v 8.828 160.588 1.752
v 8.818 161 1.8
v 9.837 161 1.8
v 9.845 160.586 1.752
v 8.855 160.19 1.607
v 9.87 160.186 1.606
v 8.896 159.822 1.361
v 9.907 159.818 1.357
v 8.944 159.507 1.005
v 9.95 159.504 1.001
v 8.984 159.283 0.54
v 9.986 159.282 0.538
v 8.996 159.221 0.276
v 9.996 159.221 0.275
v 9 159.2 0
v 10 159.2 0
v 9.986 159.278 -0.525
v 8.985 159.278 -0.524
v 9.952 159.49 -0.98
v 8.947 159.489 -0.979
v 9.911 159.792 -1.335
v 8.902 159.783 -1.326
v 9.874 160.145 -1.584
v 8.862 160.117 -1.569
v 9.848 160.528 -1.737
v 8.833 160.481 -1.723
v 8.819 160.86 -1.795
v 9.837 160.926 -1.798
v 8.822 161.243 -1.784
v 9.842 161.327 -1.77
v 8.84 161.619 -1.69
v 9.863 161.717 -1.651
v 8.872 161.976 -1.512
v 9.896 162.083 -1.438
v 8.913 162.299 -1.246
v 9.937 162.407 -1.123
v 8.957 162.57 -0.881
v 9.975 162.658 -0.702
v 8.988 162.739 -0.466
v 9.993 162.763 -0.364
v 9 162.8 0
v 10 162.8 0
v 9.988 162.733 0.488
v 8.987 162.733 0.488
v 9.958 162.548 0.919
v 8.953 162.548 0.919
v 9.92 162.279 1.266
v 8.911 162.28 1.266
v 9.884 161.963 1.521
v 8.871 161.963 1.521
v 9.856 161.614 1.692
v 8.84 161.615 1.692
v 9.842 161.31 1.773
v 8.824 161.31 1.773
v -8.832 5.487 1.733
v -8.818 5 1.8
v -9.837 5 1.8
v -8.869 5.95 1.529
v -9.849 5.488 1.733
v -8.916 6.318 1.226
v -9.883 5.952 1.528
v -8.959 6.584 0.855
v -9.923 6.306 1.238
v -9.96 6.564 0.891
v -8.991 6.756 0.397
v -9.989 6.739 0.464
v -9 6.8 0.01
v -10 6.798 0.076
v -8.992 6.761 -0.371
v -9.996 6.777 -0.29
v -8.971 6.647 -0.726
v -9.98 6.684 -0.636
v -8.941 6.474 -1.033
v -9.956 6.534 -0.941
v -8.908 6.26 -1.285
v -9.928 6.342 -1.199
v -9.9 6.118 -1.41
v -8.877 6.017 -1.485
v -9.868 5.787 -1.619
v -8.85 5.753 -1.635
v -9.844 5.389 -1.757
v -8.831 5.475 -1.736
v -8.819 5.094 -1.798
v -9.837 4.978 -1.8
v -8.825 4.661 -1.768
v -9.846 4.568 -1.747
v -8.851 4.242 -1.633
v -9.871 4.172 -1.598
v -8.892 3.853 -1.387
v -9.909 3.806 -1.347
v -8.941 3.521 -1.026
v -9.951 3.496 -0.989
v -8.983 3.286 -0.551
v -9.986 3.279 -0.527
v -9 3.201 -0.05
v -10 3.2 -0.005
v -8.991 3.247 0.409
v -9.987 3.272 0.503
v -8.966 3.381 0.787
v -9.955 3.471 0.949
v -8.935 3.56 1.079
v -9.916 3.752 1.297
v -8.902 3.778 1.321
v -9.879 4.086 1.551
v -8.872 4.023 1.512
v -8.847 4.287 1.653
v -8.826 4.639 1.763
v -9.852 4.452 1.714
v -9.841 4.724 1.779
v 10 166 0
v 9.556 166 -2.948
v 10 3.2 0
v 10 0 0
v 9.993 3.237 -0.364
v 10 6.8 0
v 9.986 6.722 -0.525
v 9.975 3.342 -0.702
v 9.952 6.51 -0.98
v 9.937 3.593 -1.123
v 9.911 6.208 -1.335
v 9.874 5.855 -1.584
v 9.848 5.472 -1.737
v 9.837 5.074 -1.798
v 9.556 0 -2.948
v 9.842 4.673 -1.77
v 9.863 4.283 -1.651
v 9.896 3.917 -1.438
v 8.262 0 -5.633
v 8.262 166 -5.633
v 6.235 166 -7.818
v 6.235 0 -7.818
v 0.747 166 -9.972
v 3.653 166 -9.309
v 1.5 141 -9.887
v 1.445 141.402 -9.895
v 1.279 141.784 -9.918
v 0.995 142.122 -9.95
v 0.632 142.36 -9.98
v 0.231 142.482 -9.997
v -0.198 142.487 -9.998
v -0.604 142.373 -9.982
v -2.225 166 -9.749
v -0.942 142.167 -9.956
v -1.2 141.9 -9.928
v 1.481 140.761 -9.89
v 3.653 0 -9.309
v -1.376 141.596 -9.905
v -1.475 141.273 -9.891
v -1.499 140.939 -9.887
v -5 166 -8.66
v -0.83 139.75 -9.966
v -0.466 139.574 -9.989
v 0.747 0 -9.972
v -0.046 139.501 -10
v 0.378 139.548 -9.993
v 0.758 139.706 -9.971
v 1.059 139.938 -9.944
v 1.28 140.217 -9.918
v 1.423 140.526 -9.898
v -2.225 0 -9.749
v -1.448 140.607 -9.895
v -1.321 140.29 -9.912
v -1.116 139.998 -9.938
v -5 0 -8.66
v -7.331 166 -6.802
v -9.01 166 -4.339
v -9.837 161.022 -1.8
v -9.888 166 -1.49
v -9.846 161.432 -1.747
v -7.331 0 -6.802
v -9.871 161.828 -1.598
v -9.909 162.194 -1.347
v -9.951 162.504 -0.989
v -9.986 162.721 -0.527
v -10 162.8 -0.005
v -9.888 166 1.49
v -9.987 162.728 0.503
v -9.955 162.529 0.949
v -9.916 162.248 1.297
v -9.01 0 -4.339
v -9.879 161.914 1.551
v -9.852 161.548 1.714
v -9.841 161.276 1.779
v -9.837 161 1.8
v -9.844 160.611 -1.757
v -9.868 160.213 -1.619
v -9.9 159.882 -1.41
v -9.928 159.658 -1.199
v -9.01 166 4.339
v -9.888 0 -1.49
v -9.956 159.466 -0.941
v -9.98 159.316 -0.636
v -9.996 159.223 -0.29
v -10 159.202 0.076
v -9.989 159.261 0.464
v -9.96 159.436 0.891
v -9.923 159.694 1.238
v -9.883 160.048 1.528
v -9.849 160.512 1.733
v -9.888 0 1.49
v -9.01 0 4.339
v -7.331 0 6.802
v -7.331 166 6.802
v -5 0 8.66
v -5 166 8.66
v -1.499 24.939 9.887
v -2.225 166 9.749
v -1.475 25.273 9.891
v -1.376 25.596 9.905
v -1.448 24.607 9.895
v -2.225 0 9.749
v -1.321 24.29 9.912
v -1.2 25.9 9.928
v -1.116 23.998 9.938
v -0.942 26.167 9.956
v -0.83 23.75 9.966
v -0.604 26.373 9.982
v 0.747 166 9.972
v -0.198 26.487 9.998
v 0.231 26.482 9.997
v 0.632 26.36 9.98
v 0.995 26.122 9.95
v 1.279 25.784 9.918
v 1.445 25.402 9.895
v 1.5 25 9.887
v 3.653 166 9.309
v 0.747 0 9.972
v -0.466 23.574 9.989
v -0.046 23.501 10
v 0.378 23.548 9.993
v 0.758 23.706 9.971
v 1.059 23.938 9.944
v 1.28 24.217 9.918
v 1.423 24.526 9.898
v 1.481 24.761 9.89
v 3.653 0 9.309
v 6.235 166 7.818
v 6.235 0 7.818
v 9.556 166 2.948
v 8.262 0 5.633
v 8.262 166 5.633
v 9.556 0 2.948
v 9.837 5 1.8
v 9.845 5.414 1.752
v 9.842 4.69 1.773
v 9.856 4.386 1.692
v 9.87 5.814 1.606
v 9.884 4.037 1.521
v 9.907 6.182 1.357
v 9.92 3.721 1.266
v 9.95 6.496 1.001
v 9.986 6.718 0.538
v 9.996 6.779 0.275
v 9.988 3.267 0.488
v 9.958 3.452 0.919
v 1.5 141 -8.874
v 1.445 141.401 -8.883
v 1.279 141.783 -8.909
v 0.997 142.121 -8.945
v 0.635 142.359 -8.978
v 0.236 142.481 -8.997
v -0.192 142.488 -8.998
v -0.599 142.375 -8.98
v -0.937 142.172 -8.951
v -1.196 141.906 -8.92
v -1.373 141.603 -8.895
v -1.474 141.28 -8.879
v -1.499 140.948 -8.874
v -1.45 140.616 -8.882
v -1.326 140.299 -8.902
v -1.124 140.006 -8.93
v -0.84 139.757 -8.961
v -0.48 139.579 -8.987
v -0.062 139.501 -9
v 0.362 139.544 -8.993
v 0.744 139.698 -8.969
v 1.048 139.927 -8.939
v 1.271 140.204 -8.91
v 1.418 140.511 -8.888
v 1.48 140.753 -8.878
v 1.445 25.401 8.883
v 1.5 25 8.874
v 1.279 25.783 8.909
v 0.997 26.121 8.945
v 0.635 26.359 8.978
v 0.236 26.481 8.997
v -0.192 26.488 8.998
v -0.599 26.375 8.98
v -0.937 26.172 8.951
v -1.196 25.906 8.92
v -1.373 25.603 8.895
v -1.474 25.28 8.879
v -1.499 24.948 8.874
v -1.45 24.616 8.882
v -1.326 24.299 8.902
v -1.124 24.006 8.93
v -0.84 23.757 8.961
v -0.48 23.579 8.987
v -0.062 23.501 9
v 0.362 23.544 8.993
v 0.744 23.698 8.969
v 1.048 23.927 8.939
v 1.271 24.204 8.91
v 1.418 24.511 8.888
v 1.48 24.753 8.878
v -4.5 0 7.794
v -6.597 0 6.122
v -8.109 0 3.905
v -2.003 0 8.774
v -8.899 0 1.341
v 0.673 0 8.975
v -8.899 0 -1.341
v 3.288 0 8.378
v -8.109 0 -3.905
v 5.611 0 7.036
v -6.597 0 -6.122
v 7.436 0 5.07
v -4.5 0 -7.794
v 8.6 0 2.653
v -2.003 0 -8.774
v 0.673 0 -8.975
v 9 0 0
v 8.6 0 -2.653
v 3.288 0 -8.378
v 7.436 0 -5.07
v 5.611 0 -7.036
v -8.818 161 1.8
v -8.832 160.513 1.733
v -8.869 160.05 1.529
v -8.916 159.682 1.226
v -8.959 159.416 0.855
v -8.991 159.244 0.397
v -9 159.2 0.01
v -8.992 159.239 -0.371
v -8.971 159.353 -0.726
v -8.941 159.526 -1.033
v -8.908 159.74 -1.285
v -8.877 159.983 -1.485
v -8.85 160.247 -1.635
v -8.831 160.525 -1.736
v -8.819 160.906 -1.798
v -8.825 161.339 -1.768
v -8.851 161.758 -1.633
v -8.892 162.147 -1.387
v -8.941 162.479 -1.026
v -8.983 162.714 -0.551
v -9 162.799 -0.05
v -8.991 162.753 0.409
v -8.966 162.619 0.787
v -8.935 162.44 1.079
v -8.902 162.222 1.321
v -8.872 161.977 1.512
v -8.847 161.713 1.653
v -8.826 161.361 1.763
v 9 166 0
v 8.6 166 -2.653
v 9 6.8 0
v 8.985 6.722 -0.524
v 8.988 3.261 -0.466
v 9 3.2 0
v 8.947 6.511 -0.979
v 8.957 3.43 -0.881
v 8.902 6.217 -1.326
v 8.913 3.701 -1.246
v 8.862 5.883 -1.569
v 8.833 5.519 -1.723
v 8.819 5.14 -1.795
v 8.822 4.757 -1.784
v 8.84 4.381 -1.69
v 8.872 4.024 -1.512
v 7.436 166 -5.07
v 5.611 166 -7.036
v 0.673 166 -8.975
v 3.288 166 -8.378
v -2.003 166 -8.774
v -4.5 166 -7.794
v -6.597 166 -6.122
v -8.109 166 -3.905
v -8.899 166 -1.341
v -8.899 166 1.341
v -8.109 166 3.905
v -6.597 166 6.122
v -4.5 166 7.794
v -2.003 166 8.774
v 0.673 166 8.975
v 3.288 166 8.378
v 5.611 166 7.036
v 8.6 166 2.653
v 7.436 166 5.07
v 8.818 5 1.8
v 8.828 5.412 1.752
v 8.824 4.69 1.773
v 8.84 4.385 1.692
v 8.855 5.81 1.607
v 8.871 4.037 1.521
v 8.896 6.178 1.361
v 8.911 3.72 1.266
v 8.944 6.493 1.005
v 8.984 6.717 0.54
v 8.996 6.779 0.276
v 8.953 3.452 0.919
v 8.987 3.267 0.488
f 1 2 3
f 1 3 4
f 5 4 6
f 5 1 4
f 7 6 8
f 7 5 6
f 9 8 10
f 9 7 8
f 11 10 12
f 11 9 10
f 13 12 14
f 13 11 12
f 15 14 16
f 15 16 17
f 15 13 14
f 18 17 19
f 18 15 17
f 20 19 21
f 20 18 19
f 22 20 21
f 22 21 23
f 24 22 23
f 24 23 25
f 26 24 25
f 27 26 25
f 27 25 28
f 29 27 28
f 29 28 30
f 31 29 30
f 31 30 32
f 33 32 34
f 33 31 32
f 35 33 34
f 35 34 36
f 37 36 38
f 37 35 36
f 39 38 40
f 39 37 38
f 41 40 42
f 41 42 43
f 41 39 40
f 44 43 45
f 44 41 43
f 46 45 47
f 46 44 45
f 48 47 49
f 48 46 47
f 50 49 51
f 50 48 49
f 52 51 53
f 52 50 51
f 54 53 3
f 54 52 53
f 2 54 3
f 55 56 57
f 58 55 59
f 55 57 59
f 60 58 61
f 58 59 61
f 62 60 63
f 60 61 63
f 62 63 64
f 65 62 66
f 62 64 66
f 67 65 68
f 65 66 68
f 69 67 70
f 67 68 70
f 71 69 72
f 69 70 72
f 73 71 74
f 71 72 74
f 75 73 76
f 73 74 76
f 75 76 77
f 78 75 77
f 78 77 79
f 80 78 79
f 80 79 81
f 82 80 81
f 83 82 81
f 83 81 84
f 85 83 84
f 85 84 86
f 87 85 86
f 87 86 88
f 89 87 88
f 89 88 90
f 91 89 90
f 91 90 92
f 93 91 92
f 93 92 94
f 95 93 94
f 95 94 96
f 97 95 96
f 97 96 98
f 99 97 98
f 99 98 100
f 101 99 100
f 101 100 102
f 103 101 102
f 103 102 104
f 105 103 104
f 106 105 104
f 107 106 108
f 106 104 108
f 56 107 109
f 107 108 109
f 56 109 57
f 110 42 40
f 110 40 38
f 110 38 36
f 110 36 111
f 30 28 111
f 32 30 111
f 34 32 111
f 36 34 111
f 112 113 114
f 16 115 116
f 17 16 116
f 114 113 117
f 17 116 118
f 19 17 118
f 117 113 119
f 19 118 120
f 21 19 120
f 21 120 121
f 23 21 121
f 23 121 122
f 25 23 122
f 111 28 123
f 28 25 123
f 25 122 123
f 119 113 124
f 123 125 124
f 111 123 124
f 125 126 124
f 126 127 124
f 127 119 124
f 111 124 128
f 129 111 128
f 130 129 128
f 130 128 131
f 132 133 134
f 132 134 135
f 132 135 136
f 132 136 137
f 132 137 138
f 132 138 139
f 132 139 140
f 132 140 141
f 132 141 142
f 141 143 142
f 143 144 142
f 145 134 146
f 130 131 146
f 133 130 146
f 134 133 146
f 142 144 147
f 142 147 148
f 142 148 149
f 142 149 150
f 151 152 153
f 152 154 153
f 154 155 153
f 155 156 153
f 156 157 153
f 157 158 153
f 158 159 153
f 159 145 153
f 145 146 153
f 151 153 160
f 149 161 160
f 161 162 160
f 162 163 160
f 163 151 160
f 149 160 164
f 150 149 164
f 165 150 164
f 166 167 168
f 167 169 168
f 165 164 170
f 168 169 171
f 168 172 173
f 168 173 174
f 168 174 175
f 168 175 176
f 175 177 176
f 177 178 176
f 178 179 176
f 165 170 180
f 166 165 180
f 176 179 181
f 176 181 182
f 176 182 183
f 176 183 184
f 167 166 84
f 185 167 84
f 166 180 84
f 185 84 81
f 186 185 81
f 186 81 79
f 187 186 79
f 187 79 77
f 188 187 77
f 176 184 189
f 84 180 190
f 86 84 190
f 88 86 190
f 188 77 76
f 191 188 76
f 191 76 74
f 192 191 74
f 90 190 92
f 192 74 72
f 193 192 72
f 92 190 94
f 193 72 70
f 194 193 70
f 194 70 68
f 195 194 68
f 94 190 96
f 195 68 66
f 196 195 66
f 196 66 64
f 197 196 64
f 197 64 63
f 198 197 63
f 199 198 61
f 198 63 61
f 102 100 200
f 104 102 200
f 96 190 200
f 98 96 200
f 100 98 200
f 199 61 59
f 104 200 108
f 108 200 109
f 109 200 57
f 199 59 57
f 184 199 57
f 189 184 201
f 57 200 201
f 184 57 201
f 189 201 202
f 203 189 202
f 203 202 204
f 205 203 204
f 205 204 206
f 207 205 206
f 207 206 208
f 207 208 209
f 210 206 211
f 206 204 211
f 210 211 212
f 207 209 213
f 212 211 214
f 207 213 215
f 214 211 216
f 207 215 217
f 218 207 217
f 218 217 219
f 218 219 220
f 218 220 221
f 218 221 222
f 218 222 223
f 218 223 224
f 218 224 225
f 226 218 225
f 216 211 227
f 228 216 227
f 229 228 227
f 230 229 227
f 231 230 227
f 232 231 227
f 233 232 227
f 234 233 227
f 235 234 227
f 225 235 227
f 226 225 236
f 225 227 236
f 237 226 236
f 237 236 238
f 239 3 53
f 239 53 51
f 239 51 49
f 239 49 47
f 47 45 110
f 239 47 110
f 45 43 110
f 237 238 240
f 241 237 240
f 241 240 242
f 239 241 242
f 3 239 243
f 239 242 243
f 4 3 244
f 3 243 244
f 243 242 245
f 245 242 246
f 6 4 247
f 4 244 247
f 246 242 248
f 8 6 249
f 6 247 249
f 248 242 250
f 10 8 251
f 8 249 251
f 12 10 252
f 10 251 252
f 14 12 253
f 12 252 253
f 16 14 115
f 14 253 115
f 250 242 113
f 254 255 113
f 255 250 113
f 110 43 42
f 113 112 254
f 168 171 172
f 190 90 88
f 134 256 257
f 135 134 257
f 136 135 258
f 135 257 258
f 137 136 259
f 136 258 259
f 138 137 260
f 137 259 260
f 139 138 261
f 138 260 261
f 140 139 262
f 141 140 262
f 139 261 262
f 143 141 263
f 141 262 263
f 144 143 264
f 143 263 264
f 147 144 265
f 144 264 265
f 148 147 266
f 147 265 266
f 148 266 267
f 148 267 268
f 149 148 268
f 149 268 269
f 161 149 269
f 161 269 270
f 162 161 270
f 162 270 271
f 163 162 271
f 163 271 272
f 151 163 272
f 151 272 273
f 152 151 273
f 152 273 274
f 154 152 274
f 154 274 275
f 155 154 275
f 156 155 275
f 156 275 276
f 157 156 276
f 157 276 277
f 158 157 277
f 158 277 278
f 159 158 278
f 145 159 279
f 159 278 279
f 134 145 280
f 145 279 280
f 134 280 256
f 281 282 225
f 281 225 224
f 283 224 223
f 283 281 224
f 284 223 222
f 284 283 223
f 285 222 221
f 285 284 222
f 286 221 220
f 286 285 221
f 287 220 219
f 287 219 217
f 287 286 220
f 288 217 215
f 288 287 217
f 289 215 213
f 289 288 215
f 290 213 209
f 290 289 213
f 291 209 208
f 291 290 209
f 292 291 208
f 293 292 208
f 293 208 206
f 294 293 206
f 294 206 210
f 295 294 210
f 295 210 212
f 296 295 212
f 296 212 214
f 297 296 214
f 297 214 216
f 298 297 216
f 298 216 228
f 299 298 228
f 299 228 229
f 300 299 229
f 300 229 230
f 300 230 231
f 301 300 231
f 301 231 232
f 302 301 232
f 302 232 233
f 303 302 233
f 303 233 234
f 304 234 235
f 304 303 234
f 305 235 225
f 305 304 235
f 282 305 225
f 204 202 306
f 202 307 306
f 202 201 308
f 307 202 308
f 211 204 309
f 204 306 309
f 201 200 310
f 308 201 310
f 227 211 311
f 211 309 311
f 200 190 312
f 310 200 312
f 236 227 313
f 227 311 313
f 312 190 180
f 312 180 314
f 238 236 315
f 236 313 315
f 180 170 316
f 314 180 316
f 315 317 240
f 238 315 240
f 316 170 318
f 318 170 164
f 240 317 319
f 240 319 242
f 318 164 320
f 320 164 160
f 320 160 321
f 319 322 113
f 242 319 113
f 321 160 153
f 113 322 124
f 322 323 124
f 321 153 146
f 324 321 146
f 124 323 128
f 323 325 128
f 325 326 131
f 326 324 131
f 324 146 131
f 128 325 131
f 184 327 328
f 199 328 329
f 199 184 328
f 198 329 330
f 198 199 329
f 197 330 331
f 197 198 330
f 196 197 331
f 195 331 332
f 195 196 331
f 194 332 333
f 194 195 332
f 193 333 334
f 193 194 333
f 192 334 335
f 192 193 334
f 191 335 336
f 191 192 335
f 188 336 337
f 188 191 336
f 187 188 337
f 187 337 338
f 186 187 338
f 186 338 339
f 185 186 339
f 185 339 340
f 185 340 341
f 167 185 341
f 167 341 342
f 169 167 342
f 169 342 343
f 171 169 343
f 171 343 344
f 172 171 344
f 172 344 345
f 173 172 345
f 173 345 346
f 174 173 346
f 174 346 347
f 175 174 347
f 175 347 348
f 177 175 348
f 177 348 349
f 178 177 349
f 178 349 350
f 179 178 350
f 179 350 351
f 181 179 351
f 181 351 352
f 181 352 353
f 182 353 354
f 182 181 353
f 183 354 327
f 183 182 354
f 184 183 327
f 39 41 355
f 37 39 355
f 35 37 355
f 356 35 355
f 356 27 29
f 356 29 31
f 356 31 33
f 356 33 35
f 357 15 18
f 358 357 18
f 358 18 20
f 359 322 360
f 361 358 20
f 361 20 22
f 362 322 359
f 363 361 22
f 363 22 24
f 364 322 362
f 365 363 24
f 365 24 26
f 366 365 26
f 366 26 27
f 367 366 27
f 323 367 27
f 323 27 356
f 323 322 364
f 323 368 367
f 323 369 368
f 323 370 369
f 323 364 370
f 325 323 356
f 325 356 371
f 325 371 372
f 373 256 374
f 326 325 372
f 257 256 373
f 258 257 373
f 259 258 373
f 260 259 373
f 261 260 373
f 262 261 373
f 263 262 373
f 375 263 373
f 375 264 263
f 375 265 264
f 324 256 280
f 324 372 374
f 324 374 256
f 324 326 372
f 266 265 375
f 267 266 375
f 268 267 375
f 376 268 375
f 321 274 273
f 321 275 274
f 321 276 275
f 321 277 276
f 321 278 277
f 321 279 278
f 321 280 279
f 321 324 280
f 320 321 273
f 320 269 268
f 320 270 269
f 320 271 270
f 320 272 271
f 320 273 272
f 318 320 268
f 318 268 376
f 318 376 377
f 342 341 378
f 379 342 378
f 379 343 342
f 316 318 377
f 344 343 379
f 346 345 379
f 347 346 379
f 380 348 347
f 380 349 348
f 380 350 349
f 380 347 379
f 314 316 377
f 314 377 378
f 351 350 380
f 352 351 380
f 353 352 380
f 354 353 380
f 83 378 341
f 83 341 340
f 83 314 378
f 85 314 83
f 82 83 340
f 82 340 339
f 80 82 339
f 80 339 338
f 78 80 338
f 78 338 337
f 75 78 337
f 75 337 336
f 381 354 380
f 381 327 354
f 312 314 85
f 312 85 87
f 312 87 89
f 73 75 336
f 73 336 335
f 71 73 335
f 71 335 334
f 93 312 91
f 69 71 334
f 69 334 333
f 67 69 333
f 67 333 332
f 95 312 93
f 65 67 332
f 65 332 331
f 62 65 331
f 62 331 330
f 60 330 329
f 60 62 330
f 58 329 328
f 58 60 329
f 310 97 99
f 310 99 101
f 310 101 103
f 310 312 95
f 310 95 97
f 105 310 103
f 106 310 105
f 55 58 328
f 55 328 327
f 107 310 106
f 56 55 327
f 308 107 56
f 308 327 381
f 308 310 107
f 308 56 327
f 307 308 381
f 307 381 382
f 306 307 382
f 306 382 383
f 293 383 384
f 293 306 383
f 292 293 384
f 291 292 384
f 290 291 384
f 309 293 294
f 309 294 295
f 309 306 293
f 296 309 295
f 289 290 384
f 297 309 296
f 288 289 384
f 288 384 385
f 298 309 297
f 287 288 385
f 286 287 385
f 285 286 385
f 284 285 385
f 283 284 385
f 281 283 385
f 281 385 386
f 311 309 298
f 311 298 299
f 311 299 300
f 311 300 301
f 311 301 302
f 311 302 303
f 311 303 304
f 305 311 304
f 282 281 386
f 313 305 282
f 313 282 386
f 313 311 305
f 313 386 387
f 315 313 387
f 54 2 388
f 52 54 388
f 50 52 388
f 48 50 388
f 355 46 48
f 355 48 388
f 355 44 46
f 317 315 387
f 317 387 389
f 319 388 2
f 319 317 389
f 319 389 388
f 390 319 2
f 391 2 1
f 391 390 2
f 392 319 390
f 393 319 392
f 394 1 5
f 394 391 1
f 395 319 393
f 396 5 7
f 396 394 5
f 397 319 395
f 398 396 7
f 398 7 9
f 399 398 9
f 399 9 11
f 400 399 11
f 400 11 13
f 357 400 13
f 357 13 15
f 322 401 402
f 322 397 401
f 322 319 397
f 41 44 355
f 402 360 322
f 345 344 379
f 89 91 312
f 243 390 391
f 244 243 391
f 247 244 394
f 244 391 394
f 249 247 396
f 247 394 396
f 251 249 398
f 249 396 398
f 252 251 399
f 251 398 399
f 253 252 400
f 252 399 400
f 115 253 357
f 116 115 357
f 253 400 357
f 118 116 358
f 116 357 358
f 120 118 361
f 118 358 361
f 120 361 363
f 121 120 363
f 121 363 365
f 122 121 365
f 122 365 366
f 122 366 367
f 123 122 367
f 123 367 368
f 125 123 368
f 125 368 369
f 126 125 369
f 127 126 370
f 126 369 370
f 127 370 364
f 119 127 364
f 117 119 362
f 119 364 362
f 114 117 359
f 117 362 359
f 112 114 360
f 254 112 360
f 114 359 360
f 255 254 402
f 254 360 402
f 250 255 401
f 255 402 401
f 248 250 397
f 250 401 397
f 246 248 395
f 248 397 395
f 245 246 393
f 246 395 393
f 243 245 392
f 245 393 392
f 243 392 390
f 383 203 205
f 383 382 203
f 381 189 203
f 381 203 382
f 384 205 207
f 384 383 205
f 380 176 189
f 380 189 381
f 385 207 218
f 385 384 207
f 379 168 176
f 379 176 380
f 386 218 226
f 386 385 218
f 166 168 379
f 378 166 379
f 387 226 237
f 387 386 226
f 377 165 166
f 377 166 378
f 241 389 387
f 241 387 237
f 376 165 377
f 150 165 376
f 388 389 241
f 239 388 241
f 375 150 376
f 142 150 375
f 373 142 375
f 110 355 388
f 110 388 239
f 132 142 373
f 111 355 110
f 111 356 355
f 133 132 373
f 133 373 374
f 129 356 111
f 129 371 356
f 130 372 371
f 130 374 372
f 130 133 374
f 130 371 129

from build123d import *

# Parameters (mm, degrees)
SKETCH1_R            = 10
SKETCH1_R_2          = 9
BOSS_EXTRUDE1_DEPTH  = 166
M3_CLEARANCE_HOLE1_D = 3.6
CUT_EXTRUDE1_REACH   = 168.601
SKETCH7_R            = 1.5
SKETCH8_R            = 1.5
CUT_EXTRUDE2_DEPTH   = 167.601320639


with BuildPart() as part:
    # Sketch1 → Boss-Extrude1 (new body)
    with BuildSketch(Plane(origin=(0, 0, 0), x_dir=(1, 0, 0), z_dir=(0, 1, 0))):
        Circle(SKETCH1_R)
        Circle(SKETCH1_R_2, mode=Mode.SUBTRACT)
    extrude(amount=BOSS_EXTRUDE1_DEPTH)

    # M3 Clearance Hole1 (through all)
    with Locations(Plane(origin=(10, 0, 0), x_dir=(0, 0, -1), z_dir=(1, 0, 0))):
        with Locations((0, 5)):
            m3_clearance_hole1 = Hole(M3_CLEARANCE_HOLE1_D / 2)

    # Mirror1: M3 Clearance Hole1 across plane
    add(m3_clearance_hole1.mirror(Plane.ZX.offset(83)), mode=Mode.SUBTRACT)

    # Sketch7 → Cut-Extrude1 (cut, up to next)
    with BuildSketch(Plane.XY, mode=Mode.PRIVATE) as cut_extrude1_sk1:
        with Locations((0, 25)):
            Circle(SKETCH7_R)
    cut_extrude1_tool1 = extrude(cut_extrude1_sk1.sketch, amount=CUT_EXTRUDE1_REACH, mode=Mode.PRIVATE) & part.part
    add(cut_extrude1_tool1.solids().sort_by_distance((0, 25, 0))[0], mode=Mode.SUBTRACT)

    # Sketch8 → Cut-Extrude2 (cut, through all)
    with BuildSketch(Plane.XY):
        with Locations((0, 141)):
            Circle(SKETCH8_R)
    extrude(amount=-CUT_EXTRUDE2_DEPTH, mode=Mode.SUBTRACT)


solid = part.part
